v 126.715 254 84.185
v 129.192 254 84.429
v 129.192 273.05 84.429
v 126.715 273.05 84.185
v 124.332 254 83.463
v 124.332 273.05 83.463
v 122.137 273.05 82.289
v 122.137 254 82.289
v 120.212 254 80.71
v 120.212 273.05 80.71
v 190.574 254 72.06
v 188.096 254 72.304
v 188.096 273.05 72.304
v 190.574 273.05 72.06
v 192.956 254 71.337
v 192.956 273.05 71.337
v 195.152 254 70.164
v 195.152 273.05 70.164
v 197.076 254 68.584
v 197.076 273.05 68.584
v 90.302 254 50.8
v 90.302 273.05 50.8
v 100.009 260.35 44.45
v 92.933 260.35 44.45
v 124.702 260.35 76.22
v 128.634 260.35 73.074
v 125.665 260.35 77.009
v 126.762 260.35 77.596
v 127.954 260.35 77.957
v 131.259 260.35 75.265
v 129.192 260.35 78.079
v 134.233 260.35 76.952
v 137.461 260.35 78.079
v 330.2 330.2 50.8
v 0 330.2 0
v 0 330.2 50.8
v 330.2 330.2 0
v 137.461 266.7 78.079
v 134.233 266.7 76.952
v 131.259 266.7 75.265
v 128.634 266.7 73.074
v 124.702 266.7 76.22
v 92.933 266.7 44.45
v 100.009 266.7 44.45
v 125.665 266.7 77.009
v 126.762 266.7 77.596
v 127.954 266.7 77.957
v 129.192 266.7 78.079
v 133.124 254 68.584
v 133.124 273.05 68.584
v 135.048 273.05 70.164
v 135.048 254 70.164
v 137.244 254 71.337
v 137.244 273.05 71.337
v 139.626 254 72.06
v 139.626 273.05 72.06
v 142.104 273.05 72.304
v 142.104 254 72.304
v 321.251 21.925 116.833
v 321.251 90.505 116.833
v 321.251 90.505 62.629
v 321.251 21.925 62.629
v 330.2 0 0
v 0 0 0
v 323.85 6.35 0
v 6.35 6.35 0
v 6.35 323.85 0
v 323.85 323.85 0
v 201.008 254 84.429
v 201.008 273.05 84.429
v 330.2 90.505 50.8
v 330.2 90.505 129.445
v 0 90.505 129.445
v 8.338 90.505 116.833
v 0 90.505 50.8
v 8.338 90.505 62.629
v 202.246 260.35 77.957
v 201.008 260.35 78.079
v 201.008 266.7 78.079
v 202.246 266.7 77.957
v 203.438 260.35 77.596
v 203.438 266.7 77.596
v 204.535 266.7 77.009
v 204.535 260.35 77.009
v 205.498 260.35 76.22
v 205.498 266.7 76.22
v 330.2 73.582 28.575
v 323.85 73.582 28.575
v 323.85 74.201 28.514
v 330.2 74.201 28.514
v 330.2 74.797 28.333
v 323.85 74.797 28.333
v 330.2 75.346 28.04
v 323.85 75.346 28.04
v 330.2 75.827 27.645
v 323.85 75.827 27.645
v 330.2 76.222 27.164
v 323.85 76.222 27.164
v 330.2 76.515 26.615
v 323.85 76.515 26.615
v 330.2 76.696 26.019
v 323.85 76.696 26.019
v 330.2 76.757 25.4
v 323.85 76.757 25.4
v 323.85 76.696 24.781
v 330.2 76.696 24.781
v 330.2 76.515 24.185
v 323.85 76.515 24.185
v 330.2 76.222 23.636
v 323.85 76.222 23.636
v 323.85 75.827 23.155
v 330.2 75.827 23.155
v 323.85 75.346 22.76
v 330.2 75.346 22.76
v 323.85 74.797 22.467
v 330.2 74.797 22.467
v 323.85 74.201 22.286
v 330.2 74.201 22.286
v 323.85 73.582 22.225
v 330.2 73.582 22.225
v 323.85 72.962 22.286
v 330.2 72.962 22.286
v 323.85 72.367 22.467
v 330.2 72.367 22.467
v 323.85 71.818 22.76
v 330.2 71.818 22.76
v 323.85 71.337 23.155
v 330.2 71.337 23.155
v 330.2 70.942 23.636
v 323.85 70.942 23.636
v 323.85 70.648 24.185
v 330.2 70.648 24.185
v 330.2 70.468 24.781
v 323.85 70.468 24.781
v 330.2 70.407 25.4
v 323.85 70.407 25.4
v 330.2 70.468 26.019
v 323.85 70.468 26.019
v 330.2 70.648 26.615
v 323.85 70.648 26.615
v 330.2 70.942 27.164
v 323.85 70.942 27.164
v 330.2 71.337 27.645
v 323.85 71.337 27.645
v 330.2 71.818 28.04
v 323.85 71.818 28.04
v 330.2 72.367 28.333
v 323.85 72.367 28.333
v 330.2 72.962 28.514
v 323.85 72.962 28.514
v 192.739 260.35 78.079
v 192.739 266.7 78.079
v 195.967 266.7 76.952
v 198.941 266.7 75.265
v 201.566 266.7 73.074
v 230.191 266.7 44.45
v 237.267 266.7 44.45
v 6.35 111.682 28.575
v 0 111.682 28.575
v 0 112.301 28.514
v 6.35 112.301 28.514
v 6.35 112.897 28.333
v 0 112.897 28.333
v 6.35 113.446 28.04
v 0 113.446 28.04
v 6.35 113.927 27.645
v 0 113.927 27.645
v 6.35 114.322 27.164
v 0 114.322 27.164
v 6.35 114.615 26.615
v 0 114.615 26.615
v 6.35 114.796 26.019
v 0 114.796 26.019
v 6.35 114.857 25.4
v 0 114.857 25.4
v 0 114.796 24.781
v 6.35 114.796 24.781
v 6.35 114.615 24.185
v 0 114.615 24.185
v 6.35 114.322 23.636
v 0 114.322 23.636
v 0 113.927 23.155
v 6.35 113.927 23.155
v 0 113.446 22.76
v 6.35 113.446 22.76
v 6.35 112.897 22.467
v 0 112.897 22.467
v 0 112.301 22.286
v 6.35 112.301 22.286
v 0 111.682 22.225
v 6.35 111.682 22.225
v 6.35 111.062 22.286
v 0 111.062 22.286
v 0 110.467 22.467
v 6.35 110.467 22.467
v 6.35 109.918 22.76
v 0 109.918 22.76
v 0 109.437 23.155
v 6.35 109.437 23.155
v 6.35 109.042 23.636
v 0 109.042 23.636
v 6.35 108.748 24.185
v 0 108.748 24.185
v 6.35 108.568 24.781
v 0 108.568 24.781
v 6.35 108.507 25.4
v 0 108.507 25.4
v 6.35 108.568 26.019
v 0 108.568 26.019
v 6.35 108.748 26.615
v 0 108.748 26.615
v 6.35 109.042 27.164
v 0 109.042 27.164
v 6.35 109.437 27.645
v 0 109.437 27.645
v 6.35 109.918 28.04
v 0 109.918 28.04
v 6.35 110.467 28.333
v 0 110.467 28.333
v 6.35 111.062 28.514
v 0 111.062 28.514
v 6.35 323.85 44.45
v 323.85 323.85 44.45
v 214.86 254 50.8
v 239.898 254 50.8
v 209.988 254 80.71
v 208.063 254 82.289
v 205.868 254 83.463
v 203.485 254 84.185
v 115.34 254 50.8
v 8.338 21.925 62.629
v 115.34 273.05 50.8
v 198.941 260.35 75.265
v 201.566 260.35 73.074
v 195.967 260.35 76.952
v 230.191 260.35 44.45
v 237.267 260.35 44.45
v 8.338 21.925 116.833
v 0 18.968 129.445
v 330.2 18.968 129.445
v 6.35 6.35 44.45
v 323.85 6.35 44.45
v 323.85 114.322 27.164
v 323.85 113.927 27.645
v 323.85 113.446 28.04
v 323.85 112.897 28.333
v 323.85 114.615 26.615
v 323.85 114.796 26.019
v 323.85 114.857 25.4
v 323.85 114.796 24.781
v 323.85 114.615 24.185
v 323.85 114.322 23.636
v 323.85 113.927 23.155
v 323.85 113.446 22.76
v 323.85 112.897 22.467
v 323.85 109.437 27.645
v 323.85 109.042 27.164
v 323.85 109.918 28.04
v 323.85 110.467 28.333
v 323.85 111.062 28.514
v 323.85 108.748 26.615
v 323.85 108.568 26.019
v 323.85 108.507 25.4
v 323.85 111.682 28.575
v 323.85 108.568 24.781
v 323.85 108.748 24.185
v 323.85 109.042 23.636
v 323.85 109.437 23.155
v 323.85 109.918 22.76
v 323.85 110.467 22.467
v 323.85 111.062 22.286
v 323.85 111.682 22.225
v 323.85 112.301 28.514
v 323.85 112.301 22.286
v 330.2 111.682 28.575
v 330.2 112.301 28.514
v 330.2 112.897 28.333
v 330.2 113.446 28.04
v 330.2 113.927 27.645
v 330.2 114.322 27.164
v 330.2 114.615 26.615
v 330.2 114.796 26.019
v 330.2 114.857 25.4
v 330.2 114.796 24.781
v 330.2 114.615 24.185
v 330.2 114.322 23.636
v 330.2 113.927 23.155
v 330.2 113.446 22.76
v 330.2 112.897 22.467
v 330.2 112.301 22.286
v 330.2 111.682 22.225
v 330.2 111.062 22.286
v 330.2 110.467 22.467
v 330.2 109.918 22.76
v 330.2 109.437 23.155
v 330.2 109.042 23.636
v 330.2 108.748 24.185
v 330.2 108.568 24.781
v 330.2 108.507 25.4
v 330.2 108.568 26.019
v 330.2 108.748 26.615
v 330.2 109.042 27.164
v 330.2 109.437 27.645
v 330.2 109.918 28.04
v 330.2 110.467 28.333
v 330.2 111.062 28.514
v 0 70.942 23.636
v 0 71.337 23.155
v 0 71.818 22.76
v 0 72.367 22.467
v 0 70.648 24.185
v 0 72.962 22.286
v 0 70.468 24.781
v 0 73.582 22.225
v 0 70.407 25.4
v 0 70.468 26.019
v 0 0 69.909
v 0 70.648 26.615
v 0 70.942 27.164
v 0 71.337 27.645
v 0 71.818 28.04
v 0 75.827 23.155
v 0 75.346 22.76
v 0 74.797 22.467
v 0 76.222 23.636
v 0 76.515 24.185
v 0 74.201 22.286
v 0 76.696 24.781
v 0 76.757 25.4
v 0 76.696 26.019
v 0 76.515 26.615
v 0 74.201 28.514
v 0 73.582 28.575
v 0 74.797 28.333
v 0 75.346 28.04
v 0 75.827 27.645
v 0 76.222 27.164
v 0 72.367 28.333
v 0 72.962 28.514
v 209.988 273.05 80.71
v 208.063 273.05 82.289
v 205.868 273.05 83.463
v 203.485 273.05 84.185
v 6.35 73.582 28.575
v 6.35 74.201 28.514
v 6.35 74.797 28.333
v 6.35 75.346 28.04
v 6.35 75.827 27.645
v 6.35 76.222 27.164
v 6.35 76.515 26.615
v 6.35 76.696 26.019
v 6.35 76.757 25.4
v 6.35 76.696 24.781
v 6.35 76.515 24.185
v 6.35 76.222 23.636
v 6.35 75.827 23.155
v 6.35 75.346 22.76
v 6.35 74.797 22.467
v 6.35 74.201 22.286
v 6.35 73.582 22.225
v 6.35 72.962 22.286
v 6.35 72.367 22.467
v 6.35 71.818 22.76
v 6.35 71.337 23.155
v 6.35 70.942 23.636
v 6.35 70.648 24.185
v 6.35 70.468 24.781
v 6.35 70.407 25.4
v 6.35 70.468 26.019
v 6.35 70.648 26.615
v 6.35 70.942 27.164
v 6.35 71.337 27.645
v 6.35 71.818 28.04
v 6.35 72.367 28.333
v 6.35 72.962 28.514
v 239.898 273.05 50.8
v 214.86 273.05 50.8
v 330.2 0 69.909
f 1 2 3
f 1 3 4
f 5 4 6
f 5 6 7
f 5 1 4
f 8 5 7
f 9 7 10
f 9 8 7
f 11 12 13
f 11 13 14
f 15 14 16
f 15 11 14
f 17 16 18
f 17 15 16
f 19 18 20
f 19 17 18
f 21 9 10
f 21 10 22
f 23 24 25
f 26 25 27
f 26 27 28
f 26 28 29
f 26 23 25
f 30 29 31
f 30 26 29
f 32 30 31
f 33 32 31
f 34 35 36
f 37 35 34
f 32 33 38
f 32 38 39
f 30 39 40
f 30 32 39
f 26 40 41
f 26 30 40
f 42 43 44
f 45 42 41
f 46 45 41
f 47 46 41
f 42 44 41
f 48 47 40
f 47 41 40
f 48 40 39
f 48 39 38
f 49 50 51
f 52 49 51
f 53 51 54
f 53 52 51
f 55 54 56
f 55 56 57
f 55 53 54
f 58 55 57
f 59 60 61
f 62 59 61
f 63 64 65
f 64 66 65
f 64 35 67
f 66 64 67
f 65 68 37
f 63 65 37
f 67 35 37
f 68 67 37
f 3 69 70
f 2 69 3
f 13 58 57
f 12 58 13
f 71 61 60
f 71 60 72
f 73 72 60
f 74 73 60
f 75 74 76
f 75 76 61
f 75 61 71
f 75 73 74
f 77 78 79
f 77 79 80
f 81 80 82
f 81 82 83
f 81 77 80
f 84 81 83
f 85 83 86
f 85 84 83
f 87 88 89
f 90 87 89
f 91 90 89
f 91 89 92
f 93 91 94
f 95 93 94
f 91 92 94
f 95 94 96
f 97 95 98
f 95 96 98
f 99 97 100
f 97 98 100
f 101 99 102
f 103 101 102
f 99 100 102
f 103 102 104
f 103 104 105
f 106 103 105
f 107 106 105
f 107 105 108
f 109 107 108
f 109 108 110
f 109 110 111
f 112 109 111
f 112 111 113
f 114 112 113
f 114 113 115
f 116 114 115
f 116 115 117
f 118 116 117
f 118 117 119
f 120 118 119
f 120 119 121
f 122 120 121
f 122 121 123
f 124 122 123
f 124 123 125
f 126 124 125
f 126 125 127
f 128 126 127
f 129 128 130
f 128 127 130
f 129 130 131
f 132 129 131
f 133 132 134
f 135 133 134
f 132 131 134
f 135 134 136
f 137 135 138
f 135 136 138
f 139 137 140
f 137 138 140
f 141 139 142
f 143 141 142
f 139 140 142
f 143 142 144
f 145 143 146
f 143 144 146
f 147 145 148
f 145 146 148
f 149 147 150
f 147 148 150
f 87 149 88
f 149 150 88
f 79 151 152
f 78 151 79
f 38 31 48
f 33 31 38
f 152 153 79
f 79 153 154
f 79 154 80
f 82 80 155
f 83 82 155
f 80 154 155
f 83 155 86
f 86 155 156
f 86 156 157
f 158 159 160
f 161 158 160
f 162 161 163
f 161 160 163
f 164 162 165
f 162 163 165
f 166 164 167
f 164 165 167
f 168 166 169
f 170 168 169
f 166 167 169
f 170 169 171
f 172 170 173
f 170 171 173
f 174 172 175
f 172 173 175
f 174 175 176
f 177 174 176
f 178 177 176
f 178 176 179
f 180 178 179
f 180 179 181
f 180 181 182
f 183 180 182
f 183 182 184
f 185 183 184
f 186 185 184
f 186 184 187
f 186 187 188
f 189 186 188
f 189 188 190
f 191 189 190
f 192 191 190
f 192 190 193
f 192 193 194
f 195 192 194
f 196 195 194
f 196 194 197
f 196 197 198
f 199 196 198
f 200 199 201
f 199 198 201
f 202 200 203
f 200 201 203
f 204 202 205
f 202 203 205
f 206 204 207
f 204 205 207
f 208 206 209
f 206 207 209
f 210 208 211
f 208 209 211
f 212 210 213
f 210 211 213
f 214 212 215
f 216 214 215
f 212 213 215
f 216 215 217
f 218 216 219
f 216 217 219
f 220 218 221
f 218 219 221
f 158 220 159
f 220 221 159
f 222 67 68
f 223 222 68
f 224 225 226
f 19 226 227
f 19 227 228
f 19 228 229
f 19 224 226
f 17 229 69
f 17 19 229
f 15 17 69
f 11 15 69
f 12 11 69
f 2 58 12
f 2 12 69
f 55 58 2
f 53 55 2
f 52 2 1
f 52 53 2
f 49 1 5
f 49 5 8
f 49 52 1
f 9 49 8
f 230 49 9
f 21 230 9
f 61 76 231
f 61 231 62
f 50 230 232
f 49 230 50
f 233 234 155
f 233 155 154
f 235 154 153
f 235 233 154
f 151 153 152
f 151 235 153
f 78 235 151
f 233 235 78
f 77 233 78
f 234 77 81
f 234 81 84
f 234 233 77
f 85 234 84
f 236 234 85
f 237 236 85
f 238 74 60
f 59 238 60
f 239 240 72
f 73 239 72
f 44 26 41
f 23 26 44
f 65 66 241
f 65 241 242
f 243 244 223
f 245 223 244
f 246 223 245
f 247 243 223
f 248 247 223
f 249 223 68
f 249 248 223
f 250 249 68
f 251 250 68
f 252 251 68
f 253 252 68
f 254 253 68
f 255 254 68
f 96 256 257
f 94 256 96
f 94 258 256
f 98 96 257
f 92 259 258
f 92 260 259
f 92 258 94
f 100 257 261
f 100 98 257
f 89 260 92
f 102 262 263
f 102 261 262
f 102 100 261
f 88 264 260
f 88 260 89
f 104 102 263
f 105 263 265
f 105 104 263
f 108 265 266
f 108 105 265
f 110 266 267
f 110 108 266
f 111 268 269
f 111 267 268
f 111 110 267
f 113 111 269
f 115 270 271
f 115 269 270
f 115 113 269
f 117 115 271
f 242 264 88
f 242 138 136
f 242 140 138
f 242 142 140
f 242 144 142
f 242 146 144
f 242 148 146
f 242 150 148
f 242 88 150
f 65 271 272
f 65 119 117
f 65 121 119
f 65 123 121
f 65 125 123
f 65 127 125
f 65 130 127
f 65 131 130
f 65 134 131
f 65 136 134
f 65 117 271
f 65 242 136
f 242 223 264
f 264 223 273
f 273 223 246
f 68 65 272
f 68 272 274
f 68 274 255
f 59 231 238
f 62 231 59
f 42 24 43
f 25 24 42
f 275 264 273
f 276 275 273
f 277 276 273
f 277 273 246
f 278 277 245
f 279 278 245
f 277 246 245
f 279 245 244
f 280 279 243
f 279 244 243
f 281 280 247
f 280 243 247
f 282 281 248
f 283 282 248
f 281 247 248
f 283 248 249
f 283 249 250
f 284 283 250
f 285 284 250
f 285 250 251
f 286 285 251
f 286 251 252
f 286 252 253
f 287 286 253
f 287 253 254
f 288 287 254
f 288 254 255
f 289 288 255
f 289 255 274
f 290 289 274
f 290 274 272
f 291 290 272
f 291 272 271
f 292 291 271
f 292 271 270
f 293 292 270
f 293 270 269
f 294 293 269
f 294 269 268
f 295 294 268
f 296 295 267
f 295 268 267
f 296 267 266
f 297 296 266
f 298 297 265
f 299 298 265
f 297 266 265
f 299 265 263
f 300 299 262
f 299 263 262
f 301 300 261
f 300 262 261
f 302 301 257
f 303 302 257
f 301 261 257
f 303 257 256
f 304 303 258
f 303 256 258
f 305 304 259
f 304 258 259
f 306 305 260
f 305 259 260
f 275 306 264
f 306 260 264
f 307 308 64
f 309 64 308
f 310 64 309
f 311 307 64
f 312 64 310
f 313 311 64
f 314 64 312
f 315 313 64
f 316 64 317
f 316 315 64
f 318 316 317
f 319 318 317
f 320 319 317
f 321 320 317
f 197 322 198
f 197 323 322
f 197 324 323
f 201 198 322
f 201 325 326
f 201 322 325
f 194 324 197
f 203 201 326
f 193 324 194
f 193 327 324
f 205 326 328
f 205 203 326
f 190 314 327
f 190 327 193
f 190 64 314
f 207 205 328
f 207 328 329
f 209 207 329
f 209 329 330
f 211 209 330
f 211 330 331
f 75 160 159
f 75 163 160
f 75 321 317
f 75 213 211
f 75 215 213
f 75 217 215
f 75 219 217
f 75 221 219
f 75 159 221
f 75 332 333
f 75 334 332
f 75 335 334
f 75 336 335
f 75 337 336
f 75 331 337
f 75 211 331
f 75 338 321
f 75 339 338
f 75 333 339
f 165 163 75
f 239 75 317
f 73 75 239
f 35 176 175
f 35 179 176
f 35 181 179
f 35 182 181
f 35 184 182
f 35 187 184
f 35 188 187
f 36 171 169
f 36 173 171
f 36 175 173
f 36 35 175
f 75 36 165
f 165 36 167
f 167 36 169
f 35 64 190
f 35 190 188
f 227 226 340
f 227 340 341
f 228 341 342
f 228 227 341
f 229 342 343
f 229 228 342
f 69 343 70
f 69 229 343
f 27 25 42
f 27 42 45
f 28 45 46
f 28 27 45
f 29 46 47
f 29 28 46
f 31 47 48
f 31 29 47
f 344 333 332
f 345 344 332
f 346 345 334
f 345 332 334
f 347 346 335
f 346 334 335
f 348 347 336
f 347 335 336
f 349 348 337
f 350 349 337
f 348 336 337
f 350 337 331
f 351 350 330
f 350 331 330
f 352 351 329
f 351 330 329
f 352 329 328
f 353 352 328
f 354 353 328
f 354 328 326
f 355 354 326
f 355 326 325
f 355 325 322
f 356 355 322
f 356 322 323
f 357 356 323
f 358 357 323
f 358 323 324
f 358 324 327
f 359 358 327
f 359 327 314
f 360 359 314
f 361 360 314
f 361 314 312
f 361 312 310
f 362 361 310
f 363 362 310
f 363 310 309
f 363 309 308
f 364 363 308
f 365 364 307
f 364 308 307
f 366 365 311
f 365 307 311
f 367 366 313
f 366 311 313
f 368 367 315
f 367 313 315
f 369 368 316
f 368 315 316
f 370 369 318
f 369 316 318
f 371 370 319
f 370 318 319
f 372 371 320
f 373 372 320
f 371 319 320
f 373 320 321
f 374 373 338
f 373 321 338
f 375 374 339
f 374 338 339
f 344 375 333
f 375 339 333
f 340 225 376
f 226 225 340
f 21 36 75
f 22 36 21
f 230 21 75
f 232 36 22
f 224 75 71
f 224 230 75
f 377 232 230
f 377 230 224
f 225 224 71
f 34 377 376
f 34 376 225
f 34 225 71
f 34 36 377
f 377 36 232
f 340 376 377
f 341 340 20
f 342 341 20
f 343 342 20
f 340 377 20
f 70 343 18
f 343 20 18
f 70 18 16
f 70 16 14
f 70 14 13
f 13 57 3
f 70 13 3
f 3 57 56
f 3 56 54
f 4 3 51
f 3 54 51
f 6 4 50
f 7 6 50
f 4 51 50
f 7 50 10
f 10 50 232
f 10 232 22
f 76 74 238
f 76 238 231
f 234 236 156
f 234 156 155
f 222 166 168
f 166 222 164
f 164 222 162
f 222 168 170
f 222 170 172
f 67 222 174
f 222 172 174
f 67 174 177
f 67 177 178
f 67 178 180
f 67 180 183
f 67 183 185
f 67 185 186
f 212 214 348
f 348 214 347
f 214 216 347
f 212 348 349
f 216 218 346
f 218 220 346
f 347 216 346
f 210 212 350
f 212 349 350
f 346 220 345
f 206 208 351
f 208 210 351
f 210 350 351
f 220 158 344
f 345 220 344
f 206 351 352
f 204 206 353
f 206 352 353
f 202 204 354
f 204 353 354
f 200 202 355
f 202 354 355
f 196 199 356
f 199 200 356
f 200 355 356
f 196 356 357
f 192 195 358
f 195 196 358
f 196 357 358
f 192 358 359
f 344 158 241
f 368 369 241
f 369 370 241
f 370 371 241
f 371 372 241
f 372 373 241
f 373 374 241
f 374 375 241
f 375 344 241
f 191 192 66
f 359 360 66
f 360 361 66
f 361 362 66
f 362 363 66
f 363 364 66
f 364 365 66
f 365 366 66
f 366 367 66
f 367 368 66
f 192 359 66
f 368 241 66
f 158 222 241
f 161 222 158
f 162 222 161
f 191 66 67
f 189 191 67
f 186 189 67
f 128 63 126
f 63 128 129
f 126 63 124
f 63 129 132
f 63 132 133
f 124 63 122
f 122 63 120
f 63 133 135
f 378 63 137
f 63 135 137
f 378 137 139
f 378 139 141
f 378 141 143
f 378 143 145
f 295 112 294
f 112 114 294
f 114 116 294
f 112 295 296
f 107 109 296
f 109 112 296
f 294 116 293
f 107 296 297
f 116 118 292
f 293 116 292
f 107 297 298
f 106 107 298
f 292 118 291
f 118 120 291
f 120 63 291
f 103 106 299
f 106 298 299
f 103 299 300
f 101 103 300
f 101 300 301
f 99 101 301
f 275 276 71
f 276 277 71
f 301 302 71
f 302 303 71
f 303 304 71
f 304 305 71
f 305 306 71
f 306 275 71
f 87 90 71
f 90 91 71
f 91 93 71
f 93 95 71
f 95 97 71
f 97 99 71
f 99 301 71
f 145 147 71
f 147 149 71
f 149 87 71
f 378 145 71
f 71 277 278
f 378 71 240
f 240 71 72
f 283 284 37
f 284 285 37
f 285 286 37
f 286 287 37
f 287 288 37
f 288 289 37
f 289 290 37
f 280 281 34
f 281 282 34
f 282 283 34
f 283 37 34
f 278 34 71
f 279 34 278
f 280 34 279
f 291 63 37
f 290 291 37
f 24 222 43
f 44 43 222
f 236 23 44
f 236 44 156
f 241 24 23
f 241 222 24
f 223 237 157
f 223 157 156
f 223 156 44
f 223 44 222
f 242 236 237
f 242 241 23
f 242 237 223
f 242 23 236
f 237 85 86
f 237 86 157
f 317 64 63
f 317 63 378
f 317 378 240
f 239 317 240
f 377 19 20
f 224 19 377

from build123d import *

# Parameters (mm, degrees)
SKETCH1_W           = 330.2
SKETCH1_H           = 330.2
BOSS_EXTRUDE1_DEPTH = 50.8
BOSS_EXTRUDE2_START = 254
BOSS_EXTRUDE2_DEPTH = 19.05
SHELL1_START        = 6.35
SHELL1_OUTLINE_W    = 317.5
SHELL1_OUTLINE_H    = 44.45
SHELL1_DEPTH        = 317.5
SHELL1_START_2      = 260.35
SHELL1_2_DEPTH      = 6.35
SKETCH3_R           = 3.175
CUT_EXTRUDE1_DEPTH  = 475.544431862
BOSS_EXTRUDE3_DEPTH = 330.2
SKETCH5_W           = 312.91275174
SKETCH5_H           = 54.204225569
CUT_EXTRUDE2_DEPTH  = 68.58


# Read off the part's stored shape, not the designer's step: Shell1
with BuildPart() as part:
    # Sketch1 → Boss-Extrude1 (new body)
    with BuildSketch(Plane.XY):
        with Locations((165.1, 165.1)):
            Rectangle(SKETCH1_W, SKETCH1_H)
    extrude(amount=BOSS_EXTRUDE1_DEPTH)

    # Sketch2 → Boss-Extrude2 (add)
    with BuildSketch(Plane(origin=(0, 0, 0), x_dir=(1, 0, 0), z_dir=(0, 1, 0)).offset(BOSS_EXTRUDE2_START)):
        with BuildLine():
            Line((142.104085231, -72.303901903), (188.095914769, -72.303901903))
            ThreePointArc((188.095914769, -72.303901903), (192.95599436, -71.337171966), (197.07617089, -68.584158024))
            Line((197.07617089, -68.584158024), (214.860328914, -50.8))
            Line((214.860328914, -50.8), (239.897502761, -50.8))
            Line((239.897502761, -50.8), (209.987762385, -80.709740376))
            ThreePointArc((209.987762385, -80.709740376), (205.867585855, -83.462754317), (201.007506264, -84.429484254))
            Line((201.007506264, -84.429484254), (129.192493736, -84.429484254))
            ThreePointArc((129.192493736, -84.429484254), (124.332414145, -83.462754317), (120.212237615, -80.709740376))
            Line((120.212237615, -80.709740376), (90.302497239, -50.8))
            Line((90.302497239, -50.8), (115.339671086, -50.8))
            Line((115.339671086, -50.8), (133.12382911, -68.584158024))
            ThreePointArc((133.12382911, -68.584158024), (137.24400564, -71.337171966), (142.104085231, -72.303901903))
        make_face()
    extrude(amount=BOSS_EXTRUDE2_DEPTH)

    # Shell1 outline → Shell1 (cut)
    with BuildSketch(Plane(origin=(0, 0, 0), x_dir=(1, 0, 0), z_dir=(0, 1, 0)).offset(SHELL1_START)):
        with Locations((165.1, -22.225)):
            Rectangle(SHELL1_OUTLINE_W, SHELL1_OUTLINE_H)
    extrude(amount=SHELL1_DEPTH, mode=Mode.SUBTRACT)

    # Shell1 2 outline → Shell1 2 (cut)
    with BuildSketch(Plane(origin=(0, 0, 0), x_dir=(1, 0, 0), z_dir=(0, 1, 0)).offset(SHELL1_START_2)):
        with BuildLine():
            Line((192.738689455, -78.079484254), (201.007506264, -78.079484254))
            ThreePointArc((201.007506264, -78.079484254), (203.43754606, -77.596119286), (205.497634325, -76.219612315))
            Line((205.497634325, -76.219612315), (237.26724664, -44.45))
            Line((237.26724664, -44.45), (230.190585035, -44.45))
            Line((230.190585035, -44.45), (201.56629895, -73.074286085))
            ThreePointArc((201.56629895, -73.074286085), (197.491905042, -76.1755001), (192.738689455, -78.079484254))
        make_face()
        with BuildLine():
            Line((128.63370105, -73.074286085), (100.009414965, -44.45))
            Line((100.009414965, -44.45), (92.93275336, -44.45))
            Line((92.93275336, -44.45), (124.702365675, -76.219612315))
            ThreePointArc((124.702365675, -76.219612315), (126.76245394, -77.596119286), (129.192493736, -78.079484254))
            Line((129.192493736, -78.079484254), (137.461310545, -78.079484254))
            ThreePointArc((137.461310545, -78.079484254), (132.708094958, -76.1755001), (128.63370105, -73.074286085))
        make_face()
    extrude(amount=SHELL1_2_DEPTH, mode=Mode.SUBTRACT)

    # Sketch3 → Cut-Extrude1 (cut, through all)
    with BuildSketch(Plane.ZY):
        with Locations((25.4, 111.6816843)):
            Circle(SKETCH3_R)
        with Locations((25.4, 73.5816843)):
            Circle(SKETCH3_R)
    extrude(amount=-CUT_EXTRUDE1_DEPTH, mode=Mode.SUBTRACT)

    # Sketch4 → Boss-Extrude3 (add)
    with BuildSketch(Plane.ZY):
        Polygon((50.8, 0), (69.908855574, 0), (129.44460093, 18.967737852), (129.44460093, 90.50525308), (50.8, 90.50525308), align=None)
    extrude(amount=-BOSS_EXTRUDE3_DEPTH)

    # Sketch5 → Cut-Extrude2 (cut)
    with BuildSketch(Plane(origin=(0, 90.50525308, 0), x_dir=(1, 0, 0), z_dir=(0, 1, 0))):
        with Locations((164.794269249, -89.730963472)):
            Rectangle(SKETCH5_W, SKETCH5_H)
    extrude(amount=-CUT_EXTRUDE2_DEPTH, mode=Mode.SUBTRACT)


solid = part.part
